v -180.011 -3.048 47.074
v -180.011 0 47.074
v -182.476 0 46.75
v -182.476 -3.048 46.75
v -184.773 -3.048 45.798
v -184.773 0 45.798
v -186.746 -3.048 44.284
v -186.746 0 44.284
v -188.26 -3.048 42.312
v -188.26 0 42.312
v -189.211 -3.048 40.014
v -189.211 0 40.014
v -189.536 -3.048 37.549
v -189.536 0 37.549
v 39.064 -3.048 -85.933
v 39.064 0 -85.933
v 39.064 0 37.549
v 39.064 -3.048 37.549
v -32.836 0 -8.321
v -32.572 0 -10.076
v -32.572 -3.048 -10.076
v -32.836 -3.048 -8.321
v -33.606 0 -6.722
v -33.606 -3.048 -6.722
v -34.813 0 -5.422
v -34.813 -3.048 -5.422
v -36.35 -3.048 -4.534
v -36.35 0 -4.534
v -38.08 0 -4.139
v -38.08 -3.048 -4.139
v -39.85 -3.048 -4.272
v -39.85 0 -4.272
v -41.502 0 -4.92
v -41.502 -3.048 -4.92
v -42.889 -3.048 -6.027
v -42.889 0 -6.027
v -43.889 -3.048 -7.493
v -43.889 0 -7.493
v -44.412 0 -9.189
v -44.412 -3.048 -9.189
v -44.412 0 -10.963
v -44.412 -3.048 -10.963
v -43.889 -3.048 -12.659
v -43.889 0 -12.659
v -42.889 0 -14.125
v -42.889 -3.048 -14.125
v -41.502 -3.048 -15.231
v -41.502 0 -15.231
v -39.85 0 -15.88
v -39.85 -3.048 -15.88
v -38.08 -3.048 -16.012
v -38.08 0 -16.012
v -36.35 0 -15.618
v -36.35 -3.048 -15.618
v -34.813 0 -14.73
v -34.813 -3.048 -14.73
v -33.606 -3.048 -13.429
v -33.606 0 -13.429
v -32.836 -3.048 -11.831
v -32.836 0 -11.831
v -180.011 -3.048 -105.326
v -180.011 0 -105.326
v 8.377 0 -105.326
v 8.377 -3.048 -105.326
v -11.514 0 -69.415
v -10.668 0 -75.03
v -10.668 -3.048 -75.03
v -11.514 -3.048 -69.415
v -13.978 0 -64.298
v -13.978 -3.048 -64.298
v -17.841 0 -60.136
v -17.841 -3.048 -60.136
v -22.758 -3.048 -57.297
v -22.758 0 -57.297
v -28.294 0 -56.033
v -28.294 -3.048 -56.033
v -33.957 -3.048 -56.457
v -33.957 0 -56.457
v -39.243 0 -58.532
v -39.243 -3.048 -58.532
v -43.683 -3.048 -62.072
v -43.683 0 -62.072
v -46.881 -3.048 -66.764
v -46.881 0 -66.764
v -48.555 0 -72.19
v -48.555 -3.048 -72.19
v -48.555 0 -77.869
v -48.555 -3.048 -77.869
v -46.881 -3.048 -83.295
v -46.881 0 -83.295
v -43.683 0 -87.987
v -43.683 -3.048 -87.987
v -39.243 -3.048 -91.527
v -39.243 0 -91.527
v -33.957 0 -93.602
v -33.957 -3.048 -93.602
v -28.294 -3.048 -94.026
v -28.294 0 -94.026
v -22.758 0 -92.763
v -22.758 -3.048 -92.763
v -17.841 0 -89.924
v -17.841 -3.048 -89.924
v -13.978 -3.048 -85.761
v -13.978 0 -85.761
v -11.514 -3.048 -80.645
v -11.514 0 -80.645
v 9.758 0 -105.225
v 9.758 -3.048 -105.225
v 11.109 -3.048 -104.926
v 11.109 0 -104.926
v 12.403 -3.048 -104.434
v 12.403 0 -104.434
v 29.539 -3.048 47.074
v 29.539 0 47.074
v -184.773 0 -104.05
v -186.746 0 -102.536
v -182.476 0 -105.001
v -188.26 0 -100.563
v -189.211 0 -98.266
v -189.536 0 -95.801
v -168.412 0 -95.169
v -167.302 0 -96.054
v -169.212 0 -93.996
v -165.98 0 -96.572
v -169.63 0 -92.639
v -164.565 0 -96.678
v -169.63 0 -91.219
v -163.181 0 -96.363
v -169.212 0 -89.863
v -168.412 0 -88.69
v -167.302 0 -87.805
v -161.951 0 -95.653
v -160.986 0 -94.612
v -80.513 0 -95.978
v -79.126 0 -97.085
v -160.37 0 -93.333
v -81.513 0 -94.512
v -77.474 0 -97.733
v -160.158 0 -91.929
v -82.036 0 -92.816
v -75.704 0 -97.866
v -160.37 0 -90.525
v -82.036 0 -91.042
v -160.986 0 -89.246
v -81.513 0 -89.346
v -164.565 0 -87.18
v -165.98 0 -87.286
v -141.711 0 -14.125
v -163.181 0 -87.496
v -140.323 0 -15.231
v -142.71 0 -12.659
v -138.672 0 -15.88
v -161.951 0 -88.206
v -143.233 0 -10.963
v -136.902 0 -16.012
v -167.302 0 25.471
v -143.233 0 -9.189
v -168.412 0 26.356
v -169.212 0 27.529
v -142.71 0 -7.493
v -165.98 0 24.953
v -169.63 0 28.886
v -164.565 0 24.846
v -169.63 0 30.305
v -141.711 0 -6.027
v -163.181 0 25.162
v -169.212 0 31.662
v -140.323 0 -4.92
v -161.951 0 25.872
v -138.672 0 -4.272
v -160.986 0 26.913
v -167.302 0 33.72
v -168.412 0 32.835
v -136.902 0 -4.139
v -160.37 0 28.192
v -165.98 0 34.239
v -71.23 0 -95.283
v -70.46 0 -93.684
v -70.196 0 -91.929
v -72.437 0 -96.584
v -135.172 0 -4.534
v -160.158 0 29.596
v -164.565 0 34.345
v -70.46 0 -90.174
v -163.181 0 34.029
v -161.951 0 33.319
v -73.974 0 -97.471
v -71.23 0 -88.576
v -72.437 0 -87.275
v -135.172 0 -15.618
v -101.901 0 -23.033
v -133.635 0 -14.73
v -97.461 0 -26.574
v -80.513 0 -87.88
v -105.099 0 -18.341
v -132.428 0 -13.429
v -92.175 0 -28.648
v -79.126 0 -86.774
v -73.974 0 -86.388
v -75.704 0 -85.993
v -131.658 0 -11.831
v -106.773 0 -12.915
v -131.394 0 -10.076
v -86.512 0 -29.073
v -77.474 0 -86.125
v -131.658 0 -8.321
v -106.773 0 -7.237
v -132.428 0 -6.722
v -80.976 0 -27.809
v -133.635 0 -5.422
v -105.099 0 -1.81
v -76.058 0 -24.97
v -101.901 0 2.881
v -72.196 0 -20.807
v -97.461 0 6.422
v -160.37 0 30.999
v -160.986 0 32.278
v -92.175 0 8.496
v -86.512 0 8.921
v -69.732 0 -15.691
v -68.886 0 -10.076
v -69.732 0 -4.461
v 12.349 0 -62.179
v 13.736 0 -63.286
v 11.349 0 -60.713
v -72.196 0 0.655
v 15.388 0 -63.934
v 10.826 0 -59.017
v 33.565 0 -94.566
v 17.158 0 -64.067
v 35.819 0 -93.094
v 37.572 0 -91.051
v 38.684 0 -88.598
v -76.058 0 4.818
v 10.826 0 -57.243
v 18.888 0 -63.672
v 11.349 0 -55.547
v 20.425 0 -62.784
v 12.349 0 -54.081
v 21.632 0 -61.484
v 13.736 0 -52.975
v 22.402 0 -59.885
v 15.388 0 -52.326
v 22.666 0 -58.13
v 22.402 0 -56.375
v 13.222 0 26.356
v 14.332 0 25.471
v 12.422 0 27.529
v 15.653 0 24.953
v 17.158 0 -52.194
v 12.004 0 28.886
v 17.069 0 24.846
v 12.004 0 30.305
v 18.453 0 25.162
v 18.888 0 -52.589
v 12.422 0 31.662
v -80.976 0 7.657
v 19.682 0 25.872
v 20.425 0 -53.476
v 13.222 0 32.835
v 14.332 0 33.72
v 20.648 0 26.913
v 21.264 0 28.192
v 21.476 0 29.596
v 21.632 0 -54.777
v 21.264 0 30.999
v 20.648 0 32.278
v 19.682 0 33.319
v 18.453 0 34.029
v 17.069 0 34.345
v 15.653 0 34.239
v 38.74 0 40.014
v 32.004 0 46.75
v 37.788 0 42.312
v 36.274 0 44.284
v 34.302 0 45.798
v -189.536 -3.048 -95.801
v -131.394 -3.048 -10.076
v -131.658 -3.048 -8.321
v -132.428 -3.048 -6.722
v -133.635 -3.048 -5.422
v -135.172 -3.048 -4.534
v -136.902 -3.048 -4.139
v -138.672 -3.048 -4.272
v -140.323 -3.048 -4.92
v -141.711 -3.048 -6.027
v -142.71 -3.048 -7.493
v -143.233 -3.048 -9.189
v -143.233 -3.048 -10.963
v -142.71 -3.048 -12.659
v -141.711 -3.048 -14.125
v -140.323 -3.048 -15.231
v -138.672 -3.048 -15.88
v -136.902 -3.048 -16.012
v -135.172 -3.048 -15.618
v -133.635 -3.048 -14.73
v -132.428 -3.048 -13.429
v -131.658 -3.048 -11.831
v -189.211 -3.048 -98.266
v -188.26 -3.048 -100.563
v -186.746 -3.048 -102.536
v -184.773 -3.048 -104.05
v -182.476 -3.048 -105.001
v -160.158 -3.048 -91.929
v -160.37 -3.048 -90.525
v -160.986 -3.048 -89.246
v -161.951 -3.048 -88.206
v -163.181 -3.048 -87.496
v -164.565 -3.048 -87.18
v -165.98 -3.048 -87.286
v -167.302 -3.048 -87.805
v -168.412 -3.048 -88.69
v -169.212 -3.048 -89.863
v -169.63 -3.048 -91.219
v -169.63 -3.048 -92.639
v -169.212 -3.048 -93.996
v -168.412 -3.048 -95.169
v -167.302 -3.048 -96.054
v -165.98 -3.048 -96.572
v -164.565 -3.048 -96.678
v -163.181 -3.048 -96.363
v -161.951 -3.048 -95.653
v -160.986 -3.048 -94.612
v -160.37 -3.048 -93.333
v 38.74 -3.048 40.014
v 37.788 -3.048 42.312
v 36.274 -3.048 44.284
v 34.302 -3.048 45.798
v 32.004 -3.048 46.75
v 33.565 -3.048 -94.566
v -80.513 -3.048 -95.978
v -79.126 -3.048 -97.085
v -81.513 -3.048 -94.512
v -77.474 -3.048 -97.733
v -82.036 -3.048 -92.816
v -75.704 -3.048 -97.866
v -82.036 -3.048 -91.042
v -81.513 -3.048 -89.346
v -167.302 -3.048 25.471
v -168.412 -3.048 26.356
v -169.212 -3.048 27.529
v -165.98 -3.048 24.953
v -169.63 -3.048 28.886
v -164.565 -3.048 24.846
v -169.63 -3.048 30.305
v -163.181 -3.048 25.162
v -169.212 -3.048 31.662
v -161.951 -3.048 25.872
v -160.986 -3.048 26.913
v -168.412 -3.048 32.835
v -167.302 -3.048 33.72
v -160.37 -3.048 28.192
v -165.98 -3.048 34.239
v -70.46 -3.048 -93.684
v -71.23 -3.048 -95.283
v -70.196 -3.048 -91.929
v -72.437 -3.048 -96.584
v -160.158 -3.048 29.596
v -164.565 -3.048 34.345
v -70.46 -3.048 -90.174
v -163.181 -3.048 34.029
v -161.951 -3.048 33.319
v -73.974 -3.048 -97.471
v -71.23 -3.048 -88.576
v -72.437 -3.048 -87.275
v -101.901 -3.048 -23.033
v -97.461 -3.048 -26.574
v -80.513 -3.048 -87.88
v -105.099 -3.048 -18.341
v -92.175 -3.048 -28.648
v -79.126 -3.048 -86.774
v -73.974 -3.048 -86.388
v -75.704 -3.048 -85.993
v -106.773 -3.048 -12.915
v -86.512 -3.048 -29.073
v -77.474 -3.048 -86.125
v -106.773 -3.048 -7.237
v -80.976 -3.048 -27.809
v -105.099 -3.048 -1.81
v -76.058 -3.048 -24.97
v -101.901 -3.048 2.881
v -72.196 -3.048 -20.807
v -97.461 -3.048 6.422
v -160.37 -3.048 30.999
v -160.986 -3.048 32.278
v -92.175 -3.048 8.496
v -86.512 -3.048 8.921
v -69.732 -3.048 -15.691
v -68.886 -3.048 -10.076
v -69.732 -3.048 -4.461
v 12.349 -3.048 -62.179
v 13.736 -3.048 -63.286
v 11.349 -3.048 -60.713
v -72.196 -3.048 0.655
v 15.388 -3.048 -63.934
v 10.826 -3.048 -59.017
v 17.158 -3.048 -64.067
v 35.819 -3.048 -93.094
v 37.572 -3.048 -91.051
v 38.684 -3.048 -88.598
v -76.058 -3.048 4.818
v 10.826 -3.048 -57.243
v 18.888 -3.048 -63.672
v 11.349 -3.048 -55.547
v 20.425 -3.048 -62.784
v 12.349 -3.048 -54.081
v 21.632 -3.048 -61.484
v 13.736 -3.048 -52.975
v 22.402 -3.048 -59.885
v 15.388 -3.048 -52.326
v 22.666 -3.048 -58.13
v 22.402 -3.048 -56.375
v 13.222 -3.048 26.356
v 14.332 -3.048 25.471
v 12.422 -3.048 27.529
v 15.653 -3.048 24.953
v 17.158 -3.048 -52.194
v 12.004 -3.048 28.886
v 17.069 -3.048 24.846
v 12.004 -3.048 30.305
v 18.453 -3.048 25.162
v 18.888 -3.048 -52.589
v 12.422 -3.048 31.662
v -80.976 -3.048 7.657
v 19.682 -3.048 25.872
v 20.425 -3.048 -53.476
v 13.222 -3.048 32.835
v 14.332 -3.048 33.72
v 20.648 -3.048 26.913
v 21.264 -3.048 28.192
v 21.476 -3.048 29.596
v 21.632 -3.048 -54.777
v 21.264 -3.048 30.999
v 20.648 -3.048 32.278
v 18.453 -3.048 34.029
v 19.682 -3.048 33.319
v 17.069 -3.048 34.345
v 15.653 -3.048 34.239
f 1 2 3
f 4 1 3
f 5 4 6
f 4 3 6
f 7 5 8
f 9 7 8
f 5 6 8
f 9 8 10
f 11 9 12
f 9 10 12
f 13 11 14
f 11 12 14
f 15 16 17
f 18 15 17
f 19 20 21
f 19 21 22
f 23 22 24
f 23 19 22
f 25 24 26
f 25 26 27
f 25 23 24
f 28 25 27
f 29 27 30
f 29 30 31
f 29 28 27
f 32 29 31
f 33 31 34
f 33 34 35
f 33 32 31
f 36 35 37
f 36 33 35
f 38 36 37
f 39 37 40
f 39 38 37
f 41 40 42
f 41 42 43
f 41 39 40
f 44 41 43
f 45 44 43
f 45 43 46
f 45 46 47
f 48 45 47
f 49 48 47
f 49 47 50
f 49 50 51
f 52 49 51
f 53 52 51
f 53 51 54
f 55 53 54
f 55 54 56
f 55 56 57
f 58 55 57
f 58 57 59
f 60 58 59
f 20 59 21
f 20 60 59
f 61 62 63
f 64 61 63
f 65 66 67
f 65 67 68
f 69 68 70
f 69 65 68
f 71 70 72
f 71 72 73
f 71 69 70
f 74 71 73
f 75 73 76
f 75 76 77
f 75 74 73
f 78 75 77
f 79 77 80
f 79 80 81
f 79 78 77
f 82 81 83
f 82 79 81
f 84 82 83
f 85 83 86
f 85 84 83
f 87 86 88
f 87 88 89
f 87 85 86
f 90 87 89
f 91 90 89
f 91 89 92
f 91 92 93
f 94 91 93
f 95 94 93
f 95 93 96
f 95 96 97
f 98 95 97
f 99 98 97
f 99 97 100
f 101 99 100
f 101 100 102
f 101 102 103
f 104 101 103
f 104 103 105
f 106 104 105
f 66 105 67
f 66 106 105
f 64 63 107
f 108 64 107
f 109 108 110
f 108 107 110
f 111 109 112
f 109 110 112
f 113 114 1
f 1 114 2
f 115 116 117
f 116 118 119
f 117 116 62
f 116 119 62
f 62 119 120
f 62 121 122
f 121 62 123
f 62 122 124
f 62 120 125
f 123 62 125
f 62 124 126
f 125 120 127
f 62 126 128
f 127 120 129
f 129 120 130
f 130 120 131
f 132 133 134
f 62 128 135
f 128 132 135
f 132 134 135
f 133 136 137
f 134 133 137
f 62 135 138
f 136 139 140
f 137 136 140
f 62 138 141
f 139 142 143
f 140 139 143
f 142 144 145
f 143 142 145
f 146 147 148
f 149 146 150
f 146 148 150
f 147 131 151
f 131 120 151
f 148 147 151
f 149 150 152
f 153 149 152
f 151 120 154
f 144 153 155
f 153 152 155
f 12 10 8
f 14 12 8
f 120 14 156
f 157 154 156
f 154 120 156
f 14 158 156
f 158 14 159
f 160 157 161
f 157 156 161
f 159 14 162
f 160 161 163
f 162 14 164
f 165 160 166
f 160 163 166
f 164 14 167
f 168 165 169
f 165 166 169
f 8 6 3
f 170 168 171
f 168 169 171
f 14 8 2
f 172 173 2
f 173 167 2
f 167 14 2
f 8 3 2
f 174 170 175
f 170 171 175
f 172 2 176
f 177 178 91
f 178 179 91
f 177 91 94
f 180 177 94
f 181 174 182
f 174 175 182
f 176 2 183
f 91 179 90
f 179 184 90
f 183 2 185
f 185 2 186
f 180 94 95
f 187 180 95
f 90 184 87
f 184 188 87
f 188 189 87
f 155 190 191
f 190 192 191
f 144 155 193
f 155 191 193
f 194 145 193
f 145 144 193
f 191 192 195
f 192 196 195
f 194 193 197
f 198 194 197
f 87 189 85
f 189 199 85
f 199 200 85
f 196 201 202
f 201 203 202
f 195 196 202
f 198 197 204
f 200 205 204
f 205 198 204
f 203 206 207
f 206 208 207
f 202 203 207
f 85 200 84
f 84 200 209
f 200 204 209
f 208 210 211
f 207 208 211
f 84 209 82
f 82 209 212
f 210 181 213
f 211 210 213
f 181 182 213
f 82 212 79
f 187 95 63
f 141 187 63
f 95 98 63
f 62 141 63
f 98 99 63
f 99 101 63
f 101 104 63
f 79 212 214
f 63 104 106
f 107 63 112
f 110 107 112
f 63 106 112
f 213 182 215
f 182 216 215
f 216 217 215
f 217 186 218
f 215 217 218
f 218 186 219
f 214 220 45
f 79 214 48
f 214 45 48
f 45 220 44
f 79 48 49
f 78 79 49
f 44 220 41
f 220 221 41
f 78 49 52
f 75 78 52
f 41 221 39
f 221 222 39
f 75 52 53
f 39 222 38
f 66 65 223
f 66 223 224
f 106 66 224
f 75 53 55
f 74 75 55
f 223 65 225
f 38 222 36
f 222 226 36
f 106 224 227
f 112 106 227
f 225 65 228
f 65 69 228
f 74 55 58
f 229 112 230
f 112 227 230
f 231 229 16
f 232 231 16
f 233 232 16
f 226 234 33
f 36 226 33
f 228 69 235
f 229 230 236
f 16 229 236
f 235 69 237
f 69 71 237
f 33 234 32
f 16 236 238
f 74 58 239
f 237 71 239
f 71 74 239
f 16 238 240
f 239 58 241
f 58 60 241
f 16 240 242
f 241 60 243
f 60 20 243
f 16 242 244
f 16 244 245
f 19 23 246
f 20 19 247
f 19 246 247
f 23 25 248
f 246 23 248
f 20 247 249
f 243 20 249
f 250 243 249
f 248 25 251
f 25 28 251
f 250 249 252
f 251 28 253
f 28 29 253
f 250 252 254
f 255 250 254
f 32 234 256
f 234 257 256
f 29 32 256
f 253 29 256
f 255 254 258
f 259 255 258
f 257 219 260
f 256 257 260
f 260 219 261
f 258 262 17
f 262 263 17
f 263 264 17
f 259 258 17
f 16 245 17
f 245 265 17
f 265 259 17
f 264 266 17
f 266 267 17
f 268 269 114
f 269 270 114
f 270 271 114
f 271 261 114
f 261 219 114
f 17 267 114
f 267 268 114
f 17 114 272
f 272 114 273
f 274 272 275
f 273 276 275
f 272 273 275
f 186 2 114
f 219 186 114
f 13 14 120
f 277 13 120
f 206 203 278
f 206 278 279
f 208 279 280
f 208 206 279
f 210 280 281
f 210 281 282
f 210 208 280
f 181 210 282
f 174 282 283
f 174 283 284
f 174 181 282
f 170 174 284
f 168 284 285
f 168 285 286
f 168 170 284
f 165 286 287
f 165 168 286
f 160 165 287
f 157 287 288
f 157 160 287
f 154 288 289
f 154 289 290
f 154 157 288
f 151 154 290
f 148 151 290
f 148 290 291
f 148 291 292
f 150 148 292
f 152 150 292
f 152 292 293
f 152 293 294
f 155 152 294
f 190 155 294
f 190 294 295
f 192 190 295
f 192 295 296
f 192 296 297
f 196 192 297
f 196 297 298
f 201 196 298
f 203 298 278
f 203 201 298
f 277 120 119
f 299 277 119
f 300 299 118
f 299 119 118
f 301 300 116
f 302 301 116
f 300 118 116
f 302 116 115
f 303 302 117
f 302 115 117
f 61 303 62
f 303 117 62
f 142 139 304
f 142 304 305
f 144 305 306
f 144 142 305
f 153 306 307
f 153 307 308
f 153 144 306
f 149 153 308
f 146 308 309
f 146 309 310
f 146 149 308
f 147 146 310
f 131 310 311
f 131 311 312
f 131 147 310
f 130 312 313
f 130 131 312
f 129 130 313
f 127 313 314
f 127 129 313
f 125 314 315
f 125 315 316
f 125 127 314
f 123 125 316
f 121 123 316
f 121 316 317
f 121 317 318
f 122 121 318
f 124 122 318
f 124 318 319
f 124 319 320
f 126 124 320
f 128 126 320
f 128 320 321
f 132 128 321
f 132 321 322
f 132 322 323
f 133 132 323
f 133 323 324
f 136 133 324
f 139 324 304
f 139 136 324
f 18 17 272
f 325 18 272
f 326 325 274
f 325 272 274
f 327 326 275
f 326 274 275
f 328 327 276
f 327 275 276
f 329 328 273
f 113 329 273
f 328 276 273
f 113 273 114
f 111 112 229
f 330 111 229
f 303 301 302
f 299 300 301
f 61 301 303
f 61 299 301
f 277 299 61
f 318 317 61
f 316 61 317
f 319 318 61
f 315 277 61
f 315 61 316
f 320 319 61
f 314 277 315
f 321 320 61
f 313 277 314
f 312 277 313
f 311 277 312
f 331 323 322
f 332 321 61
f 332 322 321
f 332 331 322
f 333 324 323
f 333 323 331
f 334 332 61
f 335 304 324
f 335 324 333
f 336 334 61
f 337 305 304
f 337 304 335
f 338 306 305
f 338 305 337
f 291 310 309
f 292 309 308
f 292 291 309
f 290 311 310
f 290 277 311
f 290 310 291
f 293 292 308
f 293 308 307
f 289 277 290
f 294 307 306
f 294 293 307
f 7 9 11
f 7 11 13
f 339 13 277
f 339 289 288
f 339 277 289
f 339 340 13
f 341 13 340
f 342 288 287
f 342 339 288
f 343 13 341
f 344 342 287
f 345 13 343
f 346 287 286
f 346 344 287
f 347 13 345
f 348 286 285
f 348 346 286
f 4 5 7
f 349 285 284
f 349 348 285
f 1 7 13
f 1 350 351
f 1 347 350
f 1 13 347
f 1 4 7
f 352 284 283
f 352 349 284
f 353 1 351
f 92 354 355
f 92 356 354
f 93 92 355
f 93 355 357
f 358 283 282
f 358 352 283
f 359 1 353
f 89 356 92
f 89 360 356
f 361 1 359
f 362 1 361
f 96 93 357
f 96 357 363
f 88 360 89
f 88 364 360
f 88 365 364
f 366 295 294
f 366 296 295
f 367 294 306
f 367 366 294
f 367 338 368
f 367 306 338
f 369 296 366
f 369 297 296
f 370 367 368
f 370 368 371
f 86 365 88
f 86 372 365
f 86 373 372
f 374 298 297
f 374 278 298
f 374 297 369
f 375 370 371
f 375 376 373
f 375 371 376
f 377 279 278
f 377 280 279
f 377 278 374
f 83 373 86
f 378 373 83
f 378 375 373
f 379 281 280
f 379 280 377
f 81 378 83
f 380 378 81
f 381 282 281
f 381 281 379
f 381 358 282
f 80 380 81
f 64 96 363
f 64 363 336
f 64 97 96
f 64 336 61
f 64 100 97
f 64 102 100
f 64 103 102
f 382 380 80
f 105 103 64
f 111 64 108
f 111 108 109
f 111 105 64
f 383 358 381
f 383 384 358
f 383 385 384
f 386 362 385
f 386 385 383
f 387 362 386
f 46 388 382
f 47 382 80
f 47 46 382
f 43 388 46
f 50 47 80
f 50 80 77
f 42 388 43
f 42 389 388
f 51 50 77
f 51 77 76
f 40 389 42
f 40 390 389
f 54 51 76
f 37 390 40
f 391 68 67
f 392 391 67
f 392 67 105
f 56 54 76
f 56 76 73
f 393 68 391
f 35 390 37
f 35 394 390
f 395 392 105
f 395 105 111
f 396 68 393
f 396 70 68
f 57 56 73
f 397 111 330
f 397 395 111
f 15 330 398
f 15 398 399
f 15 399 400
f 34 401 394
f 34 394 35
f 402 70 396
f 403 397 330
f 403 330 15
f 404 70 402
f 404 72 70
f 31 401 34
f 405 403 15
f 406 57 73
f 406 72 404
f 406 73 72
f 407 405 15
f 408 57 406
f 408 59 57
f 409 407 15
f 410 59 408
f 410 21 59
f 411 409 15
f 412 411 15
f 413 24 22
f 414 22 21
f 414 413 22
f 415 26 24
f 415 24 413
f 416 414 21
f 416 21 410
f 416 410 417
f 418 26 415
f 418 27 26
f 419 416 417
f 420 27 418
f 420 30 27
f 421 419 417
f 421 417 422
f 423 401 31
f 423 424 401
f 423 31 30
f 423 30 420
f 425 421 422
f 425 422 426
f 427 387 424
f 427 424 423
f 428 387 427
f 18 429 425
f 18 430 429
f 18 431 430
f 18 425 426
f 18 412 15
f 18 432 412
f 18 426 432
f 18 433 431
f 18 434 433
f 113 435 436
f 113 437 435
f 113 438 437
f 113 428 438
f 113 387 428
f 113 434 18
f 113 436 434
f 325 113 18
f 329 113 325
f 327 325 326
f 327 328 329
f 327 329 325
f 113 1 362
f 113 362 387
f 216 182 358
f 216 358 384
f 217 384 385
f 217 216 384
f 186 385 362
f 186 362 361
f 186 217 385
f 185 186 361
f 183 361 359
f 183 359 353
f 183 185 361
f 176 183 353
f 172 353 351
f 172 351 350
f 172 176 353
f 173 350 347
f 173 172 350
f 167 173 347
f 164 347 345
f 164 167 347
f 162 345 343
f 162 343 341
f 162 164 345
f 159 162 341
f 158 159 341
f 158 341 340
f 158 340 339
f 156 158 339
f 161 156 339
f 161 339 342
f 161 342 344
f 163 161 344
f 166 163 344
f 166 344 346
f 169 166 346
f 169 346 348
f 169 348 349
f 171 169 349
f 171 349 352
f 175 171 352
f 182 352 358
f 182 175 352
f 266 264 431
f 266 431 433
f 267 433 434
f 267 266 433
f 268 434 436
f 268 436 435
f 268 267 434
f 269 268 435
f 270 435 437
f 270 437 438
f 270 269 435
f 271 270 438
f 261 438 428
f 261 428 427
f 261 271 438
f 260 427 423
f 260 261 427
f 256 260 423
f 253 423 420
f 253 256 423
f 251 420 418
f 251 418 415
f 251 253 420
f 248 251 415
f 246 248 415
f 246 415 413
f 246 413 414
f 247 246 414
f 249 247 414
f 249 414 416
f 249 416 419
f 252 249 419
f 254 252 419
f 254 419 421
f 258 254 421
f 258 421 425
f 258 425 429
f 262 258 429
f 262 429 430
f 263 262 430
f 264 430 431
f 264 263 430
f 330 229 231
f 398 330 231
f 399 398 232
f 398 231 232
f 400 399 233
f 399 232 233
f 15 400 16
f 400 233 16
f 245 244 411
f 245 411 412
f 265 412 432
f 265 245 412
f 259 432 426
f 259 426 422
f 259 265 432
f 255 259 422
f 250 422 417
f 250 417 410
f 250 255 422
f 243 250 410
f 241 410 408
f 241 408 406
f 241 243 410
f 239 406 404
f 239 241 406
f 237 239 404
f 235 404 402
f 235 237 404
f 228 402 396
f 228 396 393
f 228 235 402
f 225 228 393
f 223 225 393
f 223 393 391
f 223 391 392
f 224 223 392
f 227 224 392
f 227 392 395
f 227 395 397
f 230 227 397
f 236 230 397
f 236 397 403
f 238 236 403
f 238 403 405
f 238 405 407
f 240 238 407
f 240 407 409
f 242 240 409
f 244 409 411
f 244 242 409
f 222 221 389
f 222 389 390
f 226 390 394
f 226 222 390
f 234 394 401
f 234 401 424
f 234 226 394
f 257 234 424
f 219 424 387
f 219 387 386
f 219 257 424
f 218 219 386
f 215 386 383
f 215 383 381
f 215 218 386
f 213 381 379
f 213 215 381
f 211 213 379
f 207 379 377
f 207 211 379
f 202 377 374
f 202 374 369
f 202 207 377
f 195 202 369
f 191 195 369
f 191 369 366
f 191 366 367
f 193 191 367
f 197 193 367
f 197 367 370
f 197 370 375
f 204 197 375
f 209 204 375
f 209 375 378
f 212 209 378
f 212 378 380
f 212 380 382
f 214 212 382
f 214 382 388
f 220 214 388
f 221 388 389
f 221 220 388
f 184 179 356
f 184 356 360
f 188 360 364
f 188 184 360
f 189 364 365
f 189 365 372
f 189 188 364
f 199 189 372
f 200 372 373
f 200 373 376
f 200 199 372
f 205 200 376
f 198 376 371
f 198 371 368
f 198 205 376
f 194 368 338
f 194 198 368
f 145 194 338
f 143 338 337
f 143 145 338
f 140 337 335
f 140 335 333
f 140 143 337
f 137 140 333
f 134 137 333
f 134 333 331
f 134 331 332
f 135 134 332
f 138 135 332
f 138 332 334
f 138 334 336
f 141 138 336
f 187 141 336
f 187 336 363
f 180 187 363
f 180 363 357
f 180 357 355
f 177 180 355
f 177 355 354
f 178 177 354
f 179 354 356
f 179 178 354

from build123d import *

# Parameters (mm, degrees)
F0_R     = 4.7625
F0_R_2   = 5.953125
F0_R_3   = 19.05
F1_DEPTH = 3.048


with BuildPart() as f1:
    # F0 (on Front) → F1 (new body)
    with BuildSketch(Plane.XZ):
        with BuildLine():
            ThreePointArc((-180.010916, 47.074063), (-186.746108, 44.284255), (-189.535916, 37.549063))
            Line((-189.535916, 37.549063), (-189.535916, -95.800937))
            ThreePointArc((-189.535916, -95.800937), (-186.746108, -102.536129), (-180.010916, -105.325937))
            Line((-180.010916, -105.325937), (8.377442, -105.325937))
            ThreePointArc((8.377442, -105.325937), (10.43903, -105.100157), (12.402881, -104.433519))
            Line((12.402881, -104.433519), (33.564523, -94.565683))
            ThreePointArc((33.564523, -94.565683), (37.572388, -91.05088), (39.064084, -85.933102))
            Line((39.064084, -85.933102), (39.064084, 37.549063))
            ThreePointArc((39.064084, 37.549063), (36.274276, 44.284255), (29.539084, 47.074063))
            Line((29.539084, 47.074063), (-180.010916, 47.074063))
        make_face()
        with Locations((-164.920668, -91.929214)):
            Circle(F0_R, mode=Mode.SUBTRACT)
        with Locations((-76.149133, -91.929214)):
            Circle(F0_R_2, mode=Mode.SUBTRACT)
        with Locations((-29.71804, -75.029679)):
            Circle(F0_R_3, mode=Mode.SUBTRACT)
        with Locations((16.713054, -58.130143)):
            Circle(F0_R_2, mode=Mode.SUBTRACT)
        with Locations((-137.346853, -10.075937)):
            Circle(F0_R_2, mode=Mode.SUBTRACT)
        with Locations((-87.935916, -10.075937)):
            Circle(F0_R_3, mode=Mode.SUBTRACT)
        with Locations((-164.920668, 29.595656)):
            Circle(F0_R, mode=Mode.SUBTRACT)
        with Locations((-38.524978, -10.075937)):
            Circle(F0_R_2, mode=Mode.SUBTRACT)
        with Locations((16.713054, 29.595656)):
            Circle(F0_R, mode=Mode.SUBTRACT)
    extrude(amount=F1_DEPTH)


solid = f1.part
